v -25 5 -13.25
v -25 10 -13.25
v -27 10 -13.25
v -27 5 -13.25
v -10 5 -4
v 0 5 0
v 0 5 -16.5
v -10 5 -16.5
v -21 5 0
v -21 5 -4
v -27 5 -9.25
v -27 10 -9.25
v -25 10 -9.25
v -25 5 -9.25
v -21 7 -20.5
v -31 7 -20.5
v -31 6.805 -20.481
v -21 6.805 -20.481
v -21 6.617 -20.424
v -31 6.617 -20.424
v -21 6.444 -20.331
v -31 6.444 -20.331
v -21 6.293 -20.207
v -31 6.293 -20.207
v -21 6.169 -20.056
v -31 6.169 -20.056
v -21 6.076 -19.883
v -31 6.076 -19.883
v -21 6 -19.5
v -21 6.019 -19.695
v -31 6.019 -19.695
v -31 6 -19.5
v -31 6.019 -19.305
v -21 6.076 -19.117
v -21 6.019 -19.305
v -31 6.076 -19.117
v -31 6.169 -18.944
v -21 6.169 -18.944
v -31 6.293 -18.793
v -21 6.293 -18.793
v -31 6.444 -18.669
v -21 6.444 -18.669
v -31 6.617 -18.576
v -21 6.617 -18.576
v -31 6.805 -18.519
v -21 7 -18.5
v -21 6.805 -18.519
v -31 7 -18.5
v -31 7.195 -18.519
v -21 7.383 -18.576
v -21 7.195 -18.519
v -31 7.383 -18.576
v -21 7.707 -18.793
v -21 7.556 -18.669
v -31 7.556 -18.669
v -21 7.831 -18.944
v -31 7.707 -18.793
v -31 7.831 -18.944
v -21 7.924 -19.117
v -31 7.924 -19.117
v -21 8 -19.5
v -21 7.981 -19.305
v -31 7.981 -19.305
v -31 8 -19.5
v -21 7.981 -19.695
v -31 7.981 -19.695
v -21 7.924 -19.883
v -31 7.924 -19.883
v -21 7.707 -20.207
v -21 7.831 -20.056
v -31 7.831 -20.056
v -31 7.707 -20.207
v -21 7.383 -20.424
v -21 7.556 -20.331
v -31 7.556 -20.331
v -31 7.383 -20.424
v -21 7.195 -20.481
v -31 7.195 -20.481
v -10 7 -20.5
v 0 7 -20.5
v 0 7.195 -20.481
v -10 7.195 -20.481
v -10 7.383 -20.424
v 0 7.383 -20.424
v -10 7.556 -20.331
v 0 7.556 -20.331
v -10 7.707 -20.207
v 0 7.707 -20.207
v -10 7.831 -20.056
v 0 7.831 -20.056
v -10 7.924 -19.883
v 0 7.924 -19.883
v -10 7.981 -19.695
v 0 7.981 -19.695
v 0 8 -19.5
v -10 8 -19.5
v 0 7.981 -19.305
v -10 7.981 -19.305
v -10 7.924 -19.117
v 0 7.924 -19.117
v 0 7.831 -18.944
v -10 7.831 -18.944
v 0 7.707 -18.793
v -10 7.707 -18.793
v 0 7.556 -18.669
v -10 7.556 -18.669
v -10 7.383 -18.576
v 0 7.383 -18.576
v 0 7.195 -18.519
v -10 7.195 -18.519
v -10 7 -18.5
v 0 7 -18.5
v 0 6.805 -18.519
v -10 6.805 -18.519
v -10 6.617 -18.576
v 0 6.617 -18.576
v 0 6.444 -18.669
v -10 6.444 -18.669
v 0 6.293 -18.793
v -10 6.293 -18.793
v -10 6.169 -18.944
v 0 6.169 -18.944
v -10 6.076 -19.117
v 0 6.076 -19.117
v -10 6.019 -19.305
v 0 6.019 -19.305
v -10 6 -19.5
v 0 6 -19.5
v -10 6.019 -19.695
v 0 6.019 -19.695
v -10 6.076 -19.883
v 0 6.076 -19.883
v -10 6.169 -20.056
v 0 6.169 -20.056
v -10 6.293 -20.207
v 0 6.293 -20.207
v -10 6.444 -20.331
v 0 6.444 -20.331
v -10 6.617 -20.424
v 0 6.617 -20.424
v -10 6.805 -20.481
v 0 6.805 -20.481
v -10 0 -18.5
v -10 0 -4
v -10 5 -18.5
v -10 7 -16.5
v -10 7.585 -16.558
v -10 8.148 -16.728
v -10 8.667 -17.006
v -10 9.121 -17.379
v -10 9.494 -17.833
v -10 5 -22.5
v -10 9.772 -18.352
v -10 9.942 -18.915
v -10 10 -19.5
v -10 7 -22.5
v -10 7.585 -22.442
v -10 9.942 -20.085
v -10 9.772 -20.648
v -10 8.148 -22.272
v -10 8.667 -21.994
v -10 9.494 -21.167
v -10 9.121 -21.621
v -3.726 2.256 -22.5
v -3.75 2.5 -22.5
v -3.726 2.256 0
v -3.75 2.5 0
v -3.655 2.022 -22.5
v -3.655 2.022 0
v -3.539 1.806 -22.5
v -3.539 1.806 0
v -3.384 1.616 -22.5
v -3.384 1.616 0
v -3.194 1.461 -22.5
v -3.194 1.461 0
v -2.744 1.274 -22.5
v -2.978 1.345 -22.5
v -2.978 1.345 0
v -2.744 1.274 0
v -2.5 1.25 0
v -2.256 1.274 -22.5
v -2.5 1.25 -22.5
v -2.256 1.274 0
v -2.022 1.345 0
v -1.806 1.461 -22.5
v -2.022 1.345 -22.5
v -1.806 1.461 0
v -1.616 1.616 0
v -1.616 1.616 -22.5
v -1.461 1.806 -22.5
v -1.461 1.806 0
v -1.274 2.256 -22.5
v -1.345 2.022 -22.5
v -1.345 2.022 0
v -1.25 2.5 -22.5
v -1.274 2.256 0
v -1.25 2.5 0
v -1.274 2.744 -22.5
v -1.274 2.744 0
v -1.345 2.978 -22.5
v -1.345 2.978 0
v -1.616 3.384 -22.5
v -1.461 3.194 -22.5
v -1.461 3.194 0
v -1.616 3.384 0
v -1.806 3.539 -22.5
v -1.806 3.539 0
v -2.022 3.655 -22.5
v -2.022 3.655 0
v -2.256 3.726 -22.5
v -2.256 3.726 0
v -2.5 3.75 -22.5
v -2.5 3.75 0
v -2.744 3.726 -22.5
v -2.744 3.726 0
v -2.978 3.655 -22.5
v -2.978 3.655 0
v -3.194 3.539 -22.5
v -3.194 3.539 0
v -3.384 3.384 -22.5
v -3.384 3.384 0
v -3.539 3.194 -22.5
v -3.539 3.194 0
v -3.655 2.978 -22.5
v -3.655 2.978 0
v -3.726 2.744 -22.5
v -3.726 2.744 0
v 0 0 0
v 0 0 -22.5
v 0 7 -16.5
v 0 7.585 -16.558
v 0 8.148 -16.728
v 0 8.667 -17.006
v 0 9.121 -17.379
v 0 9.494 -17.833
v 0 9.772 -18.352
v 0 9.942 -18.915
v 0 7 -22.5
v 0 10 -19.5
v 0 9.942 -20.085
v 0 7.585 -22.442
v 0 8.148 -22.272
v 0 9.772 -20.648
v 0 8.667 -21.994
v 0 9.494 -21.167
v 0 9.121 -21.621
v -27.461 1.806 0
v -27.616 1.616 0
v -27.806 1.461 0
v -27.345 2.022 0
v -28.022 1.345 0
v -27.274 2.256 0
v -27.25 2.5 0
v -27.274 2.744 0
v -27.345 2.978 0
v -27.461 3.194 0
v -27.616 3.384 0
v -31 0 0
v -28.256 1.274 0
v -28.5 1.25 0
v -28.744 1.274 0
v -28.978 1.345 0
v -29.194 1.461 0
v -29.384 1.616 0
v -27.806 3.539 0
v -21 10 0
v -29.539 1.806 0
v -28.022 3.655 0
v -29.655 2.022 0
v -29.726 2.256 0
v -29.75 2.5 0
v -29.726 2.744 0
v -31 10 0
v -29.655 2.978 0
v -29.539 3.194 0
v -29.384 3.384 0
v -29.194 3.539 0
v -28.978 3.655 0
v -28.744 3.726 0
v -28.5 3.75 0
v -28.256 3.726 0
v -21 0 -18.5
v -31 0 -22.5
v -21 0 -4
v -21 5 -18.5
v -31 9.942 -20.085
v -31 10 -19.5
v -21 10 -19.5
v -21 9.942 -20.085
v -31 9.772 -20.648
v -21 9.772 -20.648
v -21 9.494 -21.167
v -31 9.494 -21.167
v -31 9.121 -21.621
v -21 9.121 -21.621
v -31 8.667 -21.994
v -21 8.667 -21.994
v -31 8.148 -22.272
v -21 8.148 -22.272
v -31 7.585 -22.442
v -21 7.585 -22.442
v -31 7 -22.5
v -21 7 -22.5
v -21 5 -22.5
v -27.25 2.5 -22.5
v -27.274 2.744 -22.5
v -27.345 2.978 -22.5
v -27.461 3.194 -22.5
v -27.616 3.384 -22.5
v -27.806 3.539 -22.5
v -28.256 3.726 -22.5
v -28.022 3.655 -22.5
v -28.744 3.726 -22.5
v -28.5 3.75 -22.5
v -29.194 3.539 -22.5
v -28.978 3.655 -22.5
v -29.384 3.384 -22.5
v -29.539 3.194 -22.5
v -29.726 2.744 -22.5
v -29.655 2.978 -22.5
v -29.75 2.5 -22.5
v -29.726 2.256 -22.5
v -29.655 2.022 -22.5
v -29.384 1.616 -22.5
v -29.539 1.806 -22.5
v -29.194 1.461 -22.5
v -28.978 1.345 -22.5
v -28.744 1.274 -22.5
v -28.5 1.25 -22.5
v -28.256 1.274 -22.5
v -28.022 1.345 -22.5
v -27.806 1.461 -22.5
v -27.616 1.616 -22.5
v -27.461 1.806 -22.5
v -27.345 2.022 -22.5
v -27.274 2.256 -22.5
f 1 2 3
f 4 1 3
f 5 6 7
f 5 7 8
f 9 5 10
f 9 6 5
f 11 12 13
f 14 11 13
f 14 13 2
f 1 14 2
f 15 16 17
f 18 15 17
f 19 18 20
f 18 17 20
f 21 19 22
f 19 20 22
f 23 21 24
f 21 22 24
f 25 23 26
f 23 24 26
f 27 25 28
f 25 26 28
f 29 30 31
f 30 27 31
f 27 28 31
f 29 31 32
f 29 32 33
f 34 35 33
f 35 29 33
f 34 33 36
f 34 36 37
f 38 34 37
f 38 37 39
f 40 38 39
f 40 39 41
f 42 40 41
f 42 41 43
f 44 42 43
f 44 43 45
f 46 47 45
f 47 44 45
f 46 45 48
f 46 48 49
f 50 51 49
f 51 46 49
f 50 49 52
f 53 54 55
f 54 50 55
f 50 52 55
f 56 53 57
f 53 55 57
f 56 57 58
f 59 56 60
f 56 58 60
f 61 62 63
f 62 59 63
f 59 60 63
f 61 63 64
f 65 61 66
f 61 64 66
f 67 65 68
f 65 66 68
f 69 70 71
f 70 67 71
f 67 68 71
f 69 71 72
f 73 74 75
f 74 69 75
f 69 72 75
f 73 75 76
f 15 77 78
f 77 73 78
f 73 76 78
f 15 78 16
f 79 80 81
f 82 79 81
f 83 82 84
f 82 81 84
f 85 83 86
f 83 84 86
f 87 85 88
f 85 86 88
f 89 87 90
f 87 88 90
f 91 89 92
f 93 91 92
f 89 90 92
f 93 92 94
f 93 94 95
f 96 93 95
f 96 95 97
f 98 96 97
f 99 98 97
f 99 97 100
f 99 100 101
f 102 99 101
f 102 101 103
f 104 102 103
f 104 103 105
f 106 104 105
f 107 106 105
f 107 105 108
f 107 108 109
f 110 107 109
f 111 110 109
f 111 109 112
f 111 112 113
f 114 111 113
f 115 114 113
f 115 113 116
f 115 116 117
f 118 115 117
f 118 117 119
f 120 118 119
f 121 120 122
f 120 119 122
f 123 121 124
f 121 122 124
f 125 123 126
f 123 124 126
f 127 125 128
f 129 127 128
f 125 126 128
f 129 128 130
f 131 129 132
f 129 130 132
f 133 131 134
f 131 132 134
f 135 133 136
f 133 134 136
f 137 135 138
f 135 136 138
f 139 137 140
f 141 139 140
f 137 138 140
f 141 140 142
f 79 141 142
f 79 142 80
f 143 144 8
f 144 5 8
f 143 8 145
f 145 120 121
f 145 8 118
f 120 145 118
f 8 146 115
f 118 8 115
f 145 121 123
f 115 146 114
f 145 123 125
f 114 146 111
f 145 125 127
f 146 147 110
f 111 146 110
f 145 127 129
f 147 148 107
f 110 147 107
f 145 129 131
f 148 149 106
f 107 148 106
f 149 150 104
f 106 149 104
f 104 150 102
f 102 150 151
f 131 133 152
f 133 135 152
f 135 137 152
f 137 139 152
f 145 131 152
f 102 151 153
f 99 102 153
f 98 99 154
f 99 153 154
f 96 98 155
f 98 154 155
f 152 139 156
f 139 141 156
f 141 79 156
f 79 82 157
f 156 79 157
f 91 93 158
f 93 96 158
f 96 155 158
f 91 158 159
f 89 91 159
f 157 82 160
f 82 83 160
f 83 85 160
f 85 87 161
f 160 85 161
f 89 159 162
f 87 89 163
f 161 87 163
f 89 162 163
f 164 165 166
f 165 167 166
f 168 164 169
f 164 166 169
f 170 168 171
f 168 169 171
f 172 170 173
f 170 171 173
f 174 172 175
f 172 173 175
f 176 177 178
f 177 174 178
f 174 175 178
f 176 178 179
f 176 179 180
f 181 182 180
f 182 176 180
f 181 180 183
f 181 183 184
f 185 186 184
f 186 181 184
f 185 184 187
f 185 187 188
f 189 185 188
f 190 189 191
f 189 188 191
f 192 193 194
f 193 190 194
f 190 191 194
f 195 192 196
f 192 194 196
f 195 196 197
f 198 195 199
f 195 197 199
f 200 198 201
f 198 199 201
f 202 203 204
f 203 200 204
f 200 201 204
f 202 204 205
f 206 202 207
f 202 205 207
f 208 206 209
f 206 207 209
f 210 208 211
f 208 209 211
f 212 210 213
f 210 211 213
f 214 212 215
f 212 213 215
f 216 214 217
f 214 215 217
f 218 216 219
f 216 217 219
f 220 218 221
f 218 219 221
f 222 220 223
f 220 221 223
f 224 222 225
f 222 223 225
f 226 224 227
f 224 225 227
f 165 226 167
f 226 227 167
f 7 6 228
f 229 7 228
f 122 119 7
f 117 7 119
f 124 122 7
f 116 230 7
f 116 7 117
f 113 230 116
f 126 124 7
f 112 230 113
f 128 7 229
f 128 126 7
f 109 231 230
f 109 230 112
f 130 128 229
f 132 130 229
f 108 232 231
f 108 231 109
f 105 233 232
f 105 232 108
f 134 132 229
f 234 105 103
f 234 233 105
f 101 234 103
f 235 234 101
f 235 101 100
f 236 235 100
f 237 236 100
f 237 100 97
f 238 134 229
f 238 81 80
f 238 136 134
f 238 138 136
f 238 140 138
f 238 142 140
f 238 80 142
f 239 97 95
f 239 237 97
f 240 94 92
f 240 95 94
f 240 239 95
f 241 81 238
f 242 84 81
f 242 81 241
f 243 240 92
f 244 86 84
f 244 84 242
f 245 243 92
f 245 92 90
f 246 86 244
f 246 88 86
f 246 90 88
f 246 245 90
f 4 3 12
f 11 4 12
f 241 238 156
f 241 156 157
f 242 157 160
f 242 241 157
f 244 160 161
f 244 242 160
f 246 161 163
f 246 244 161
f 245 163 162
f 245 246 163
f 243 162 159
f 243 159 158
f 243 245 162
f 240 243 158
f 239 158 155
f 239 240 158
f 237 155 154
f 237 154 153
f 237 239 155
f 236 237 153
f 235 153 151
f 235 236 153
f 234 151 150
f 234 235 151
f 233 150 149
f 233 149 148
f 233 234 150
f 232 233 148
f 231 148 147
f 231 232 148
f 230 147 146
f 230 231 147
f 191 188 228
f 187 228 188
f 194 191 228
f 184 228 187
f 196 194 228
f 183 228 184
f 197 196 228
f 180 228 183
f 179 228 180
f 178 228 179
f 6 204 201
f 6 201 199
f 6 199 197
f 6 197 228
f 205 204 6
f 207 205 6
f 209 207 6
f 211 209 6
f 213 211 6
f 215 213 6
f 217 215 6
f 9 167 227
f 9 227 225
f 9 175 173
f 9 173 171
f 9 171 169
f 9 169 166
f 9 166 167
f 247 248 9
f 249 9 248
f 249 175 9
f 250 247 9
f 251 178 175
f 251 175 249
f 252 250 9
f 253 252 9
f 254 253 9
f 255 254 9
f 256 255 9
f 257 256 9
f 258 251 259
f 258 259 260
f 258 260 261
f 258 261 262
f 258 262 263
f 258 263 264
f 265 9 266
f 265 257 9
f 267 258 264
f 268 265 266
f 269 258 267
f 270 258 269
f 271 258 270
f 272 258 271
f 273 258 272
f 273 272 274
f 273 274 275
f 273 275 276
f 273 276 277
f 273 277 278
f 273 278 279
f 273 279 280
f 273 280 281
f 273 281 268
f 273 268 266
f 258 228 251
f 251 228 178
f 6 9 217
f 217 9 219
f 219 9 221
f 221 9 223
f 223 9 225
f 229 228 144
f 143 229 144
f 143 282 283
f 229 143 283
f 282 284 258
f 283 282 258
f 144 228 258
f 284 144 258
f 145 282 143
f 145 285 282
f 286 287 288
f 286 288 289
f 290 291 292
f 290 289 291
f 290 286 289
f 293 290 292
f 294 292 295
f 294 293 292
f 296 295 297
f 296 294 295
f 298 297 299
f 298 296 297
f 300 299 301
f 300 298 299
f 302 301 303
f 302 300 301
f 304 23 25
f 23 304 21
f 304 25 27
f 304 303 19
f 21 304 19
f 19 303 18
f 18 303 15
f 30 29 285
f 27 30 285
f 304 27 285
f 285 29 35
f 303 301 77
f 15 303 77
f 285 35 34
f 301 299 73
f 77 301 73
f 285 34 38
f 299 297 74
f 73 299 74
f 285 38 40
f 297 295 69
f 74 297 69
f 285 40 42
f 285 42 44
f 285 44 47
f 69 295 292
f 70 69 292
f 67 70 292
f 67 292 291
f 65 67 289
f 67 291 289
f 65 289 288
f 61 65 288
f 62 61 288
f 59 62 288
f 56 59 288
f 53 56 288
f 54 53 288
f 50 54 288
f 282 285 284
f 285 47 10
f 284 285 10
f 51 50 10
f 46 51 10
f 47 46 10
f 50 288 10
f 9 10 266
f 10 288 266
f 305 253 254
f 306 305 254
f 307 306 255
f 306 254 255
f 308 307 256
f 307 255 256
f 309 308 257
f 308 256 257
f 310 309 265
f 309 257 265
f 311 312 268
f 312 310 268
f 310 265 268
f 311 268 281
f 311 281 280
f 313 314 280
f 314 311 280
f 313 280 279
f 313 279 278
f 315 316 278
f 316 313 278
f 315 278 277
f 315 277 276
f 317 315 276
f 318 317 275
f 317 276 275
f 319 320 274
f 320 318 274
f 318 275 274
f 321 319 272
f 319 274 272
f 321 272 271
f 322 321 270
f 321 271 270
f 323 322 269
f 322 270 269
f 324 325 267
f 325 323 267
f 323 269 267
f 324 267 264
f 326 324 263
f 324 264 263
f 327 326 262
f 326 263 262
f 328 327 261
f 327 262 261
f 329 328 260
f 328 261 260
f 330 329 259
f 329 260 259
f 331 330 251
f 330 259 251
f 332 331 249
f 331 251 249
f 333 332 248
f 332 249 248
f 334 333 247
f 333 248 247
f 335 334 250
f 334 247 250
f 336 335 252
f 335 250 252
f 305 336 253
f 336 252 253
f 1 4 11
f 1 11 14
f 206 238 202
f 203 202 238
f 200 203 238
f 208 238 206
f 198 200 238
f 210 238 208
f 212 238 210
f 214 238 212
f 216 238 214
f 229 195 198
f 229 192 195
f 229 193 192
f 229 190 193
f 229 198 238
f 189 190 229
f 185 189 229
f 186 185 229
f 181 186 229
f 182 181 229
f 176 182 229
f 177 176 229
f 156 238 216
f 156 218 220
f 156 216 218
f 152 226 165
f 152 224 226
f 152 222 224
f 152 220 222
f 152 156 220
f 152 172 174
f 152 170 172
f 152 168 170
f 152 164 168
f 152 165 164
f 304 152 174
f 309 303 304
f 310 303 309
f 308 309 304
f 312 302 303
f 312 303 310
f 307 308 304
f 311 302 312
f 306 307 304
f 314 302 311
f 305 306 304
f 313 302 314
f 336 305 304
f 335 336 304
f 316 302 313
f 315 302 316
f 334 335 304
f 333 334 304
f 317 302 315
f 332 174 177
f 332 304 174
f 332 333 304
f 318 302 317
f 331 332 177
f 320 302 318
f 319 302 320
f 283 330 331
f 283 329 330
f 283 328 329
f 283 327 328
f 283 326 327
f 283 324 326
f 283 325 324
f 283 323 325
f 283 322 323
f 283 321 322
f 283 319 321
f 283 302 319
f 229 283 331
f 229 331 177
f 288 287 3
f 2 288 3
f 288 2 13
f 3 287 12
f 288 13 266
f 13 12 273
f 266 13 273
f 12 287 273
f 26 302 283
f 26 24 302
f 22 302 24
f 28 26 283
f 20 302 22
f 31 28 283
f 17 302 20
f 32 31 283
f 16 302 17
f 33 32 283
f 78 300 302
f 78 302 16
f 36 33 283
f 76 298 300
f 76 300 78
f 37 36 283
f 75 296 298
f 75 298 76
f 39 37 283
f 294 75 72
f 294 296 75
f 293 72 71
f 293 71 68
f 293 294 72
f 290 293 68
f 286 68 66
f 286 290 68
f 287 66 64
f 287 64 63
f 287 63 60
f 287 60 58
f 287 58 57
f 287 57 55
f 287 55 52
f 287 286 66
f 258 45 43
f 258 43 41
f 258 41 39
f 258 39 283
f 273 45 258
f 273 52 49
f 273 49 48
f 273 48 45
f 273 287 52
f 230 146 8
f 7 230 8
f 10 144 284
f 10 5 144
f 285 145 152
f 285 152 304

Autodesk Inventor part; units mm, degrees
ref_plane "YZ Plane" through (0, 0, 0) normal (1, 0, 0) x (0, 1, 0)
ref_plane "XZ Plane" through (0, 0, 0) normal (0, 1, 0) x (-1, 0, 0)
ref_plane "XY Plane" through (0, 0, 0) normal (0, 0, 1) x (1, 0, 0)
sketch "Sketch1" plane through (0, 0, 0) normal (0, 1, 0) x (-1, 0, 0)
  line L0 (0, 0) -> (0, -22.5)
  line L1 (0, -22.5) -> (31, -22.5)
  line L2 (31, -22.5) -> (31, 0)
  line L3 (31, 0) -> (0, 0)
  dimension "d0" = 22.5
  dimension "d1" = 31
extrude "Extrusion1" add sketch "Sketch1" along normal blind 5
sketch "Sketch2" plane through (-31, 0, 0) normal (0, 0, 1) x (1, 0, 0)
  line L0 (0, 0) -> (31, 0) projected
  line L1 (31, 0) -> (31, 5) projected
  line L2 (0, 5) -> (31, 5) projected
  line L3 (0, 0) -> (0, 5) projected
  line L4 (0, 0) -> (0, 5) projected
  line L5 (0, 2.5) -> (2.5, 2.5)
  circle A0 centre (2.5, 2.5) radius 1.25
  dimension "d4" = 2.5
  dimension "d5" = 2.5
extrude "Extrusion2" cut sketch "Sketch2" against normal up to next contours A0
ref_plane "Work Plane1" through (-15.5, 0, 0) normal (1, 0, 0) x (0, 0, -1)
mirror "Mirror1" about plane through (-15.5, 0, 0) normal (1, 0, 0) of "Extrusion2"
sketch "Sketch3" plane through (0, 5, 0) normal (0, 1, 0) x (1, 0, 0)
  line L0 (0, 0) -> (0, 22.5) projected
  line L1 (0, 22.5) -> (-31, 22.5) projected
  line L2 (-31, 22.5) -> (-31, 0) projected
  line L3 (-31, 0) -> (0, 0) projected
  line L4 (0, 22.5) -> (-31, 22.5) projected
  line L5 (-15.5, 22.5) -> (-15.5, 18.5)
  line L6 (-31, 0) -> (0, 0) projected
  line L7 (-15.5, 0) -> (-15.5, 4)
  line L8 (-21, 18.5) -> (-10, 18.5)
  line L9 (-10, 18.5) -> (-10, 4)
  line L10 (-21, 4) -> (-21, 18.5)
  line L11 (-31, 22.5) -> (-31, 0) projected
  line L12 (-10, 4) -> (-15.5, 4)
  line L13 (-15.5, 4) -> (-21, 4)
  dimension "d8" = 4
  dimension "d9" = 4
  dimension "d11" = 11
extrude "Extrusion3" cut sketch "Sketch3" against normal up to next contours L13 L10 L8 L9 L12
sketch "Sketch4" plane through (0, 0, 0) normal (1, 0, 0) x (0, 0, -1)
  line L0 (0, 0) -> (22.5, 0) projected
  line L1 (22.5, 0) -> (22.5, 5) projected
  line L2 (0, 5) -> (22.5, 5) projected
  line L3 (0, 0) -> (0, 5) projected
  line L4 (0, 5) -> (22.5, 5) projected
  line L5 (22.5, 0) -> (22.5, 5) projected
  line L6 (22.5, 5) -> (22.5, 7)
  line L7 (22.5, 7) -> (19.5, 7)
  arc A0 (22.5, 7) -> (16.5, 7) centre (19.5, 7) ccw
  line L8 (16.5, 7) -> (16.5, 5)
  circle A1 centre (19.5, 7) radius 1
  dimension "d21" = 2
  dimension "d22" = 3
  dimension "d23" = 2
extrude "Extrusion4" add sketch "Sketch4" against normal blind 10 contours L2 L8 A0 L6
ref_plane "Work Plane2" through (-15.5, 0, -22.5) normal (-1, 0, 0) x (0, 0, 1)
mirror "Mirror2" about plane through (-15.5, 0, -22.5) normal (-1, 0, 0) of "Extrusion4"
sketch "Sketch6" plane through (-31, 0, -22.5) normal (-1, 0, 0) x (0, 0, 1)
  circle A0 centre (3, 7) radius 1 projected
  line L0 (0, 0) -> (22.5, 0) projected
  line L1 (22.5, 0) -> (22.5, 5) projected
  line L2 (6, 5) -> (22.5, 5) projected
  line L3 (6, 7) -> (6, 5) projected
  arc A1 (6, 7) -> (0, 7) centre (3, 7) ccw projected
  line L4 (0, 0) -> (0, 7) projected
  arc A2 (6, 7) -> (0, 7) centre (3, 7) ccw projected
  line L5 (3, 10) -> (22.5, 10)
  line L6 (6, 5) -> (22.5, 5) projected
  line L7 (22.5, 5) -> (22.5, 10)
extrude "Extrusion6" add sketch "Sketch6" against normal up to surface (10 mm away) contours L2 L3 A1 L5 L7
sketch "Sketch7" plane through (-31, 10, 0) normal (0, 1, 0) x (1, 0, 0)
  line L0 (10, 19.5) -> (10, 0) projected
  line L1 (10, 19.5) -> (0, 19.5) projected
  line L2 (0, 0) -> (0, 19.5) projected
  line L3 (0, 0) -> (10, 0) projected
  line L4 (6, 13.25) -> (4, 13.25)
  line L5 (4, 13.25) -> (4, 9.25)
  line L6 (4, 9.25) -> (6, 9.25)
  line L7 (6, 9.25) -> (6, 13.25)
  line L8 (0, 0) -> (0, 19.5) projected
  line L9 (0, 11.25) -> (4, 11.25)
  line L10 (6, 11.25) -> (10, 11.25)
  line L11 (10, 19.5) -> (10, 0) projected
  line L12 (0, 22.5) -> (10, 22.5) projected
  line L13 (5, 22.5) -> (5, 13.25)
  line L14 (5, 9.25) -> (5, 0)
  point P0 (31, 0)
  dimension "d28" = 2
  dimension "d29" = 4
extrude "Extrusion7" cut sketch "Sketch7" against normal blind 5 contours L7 L6 L5 L4
properties part number "Carriage"
